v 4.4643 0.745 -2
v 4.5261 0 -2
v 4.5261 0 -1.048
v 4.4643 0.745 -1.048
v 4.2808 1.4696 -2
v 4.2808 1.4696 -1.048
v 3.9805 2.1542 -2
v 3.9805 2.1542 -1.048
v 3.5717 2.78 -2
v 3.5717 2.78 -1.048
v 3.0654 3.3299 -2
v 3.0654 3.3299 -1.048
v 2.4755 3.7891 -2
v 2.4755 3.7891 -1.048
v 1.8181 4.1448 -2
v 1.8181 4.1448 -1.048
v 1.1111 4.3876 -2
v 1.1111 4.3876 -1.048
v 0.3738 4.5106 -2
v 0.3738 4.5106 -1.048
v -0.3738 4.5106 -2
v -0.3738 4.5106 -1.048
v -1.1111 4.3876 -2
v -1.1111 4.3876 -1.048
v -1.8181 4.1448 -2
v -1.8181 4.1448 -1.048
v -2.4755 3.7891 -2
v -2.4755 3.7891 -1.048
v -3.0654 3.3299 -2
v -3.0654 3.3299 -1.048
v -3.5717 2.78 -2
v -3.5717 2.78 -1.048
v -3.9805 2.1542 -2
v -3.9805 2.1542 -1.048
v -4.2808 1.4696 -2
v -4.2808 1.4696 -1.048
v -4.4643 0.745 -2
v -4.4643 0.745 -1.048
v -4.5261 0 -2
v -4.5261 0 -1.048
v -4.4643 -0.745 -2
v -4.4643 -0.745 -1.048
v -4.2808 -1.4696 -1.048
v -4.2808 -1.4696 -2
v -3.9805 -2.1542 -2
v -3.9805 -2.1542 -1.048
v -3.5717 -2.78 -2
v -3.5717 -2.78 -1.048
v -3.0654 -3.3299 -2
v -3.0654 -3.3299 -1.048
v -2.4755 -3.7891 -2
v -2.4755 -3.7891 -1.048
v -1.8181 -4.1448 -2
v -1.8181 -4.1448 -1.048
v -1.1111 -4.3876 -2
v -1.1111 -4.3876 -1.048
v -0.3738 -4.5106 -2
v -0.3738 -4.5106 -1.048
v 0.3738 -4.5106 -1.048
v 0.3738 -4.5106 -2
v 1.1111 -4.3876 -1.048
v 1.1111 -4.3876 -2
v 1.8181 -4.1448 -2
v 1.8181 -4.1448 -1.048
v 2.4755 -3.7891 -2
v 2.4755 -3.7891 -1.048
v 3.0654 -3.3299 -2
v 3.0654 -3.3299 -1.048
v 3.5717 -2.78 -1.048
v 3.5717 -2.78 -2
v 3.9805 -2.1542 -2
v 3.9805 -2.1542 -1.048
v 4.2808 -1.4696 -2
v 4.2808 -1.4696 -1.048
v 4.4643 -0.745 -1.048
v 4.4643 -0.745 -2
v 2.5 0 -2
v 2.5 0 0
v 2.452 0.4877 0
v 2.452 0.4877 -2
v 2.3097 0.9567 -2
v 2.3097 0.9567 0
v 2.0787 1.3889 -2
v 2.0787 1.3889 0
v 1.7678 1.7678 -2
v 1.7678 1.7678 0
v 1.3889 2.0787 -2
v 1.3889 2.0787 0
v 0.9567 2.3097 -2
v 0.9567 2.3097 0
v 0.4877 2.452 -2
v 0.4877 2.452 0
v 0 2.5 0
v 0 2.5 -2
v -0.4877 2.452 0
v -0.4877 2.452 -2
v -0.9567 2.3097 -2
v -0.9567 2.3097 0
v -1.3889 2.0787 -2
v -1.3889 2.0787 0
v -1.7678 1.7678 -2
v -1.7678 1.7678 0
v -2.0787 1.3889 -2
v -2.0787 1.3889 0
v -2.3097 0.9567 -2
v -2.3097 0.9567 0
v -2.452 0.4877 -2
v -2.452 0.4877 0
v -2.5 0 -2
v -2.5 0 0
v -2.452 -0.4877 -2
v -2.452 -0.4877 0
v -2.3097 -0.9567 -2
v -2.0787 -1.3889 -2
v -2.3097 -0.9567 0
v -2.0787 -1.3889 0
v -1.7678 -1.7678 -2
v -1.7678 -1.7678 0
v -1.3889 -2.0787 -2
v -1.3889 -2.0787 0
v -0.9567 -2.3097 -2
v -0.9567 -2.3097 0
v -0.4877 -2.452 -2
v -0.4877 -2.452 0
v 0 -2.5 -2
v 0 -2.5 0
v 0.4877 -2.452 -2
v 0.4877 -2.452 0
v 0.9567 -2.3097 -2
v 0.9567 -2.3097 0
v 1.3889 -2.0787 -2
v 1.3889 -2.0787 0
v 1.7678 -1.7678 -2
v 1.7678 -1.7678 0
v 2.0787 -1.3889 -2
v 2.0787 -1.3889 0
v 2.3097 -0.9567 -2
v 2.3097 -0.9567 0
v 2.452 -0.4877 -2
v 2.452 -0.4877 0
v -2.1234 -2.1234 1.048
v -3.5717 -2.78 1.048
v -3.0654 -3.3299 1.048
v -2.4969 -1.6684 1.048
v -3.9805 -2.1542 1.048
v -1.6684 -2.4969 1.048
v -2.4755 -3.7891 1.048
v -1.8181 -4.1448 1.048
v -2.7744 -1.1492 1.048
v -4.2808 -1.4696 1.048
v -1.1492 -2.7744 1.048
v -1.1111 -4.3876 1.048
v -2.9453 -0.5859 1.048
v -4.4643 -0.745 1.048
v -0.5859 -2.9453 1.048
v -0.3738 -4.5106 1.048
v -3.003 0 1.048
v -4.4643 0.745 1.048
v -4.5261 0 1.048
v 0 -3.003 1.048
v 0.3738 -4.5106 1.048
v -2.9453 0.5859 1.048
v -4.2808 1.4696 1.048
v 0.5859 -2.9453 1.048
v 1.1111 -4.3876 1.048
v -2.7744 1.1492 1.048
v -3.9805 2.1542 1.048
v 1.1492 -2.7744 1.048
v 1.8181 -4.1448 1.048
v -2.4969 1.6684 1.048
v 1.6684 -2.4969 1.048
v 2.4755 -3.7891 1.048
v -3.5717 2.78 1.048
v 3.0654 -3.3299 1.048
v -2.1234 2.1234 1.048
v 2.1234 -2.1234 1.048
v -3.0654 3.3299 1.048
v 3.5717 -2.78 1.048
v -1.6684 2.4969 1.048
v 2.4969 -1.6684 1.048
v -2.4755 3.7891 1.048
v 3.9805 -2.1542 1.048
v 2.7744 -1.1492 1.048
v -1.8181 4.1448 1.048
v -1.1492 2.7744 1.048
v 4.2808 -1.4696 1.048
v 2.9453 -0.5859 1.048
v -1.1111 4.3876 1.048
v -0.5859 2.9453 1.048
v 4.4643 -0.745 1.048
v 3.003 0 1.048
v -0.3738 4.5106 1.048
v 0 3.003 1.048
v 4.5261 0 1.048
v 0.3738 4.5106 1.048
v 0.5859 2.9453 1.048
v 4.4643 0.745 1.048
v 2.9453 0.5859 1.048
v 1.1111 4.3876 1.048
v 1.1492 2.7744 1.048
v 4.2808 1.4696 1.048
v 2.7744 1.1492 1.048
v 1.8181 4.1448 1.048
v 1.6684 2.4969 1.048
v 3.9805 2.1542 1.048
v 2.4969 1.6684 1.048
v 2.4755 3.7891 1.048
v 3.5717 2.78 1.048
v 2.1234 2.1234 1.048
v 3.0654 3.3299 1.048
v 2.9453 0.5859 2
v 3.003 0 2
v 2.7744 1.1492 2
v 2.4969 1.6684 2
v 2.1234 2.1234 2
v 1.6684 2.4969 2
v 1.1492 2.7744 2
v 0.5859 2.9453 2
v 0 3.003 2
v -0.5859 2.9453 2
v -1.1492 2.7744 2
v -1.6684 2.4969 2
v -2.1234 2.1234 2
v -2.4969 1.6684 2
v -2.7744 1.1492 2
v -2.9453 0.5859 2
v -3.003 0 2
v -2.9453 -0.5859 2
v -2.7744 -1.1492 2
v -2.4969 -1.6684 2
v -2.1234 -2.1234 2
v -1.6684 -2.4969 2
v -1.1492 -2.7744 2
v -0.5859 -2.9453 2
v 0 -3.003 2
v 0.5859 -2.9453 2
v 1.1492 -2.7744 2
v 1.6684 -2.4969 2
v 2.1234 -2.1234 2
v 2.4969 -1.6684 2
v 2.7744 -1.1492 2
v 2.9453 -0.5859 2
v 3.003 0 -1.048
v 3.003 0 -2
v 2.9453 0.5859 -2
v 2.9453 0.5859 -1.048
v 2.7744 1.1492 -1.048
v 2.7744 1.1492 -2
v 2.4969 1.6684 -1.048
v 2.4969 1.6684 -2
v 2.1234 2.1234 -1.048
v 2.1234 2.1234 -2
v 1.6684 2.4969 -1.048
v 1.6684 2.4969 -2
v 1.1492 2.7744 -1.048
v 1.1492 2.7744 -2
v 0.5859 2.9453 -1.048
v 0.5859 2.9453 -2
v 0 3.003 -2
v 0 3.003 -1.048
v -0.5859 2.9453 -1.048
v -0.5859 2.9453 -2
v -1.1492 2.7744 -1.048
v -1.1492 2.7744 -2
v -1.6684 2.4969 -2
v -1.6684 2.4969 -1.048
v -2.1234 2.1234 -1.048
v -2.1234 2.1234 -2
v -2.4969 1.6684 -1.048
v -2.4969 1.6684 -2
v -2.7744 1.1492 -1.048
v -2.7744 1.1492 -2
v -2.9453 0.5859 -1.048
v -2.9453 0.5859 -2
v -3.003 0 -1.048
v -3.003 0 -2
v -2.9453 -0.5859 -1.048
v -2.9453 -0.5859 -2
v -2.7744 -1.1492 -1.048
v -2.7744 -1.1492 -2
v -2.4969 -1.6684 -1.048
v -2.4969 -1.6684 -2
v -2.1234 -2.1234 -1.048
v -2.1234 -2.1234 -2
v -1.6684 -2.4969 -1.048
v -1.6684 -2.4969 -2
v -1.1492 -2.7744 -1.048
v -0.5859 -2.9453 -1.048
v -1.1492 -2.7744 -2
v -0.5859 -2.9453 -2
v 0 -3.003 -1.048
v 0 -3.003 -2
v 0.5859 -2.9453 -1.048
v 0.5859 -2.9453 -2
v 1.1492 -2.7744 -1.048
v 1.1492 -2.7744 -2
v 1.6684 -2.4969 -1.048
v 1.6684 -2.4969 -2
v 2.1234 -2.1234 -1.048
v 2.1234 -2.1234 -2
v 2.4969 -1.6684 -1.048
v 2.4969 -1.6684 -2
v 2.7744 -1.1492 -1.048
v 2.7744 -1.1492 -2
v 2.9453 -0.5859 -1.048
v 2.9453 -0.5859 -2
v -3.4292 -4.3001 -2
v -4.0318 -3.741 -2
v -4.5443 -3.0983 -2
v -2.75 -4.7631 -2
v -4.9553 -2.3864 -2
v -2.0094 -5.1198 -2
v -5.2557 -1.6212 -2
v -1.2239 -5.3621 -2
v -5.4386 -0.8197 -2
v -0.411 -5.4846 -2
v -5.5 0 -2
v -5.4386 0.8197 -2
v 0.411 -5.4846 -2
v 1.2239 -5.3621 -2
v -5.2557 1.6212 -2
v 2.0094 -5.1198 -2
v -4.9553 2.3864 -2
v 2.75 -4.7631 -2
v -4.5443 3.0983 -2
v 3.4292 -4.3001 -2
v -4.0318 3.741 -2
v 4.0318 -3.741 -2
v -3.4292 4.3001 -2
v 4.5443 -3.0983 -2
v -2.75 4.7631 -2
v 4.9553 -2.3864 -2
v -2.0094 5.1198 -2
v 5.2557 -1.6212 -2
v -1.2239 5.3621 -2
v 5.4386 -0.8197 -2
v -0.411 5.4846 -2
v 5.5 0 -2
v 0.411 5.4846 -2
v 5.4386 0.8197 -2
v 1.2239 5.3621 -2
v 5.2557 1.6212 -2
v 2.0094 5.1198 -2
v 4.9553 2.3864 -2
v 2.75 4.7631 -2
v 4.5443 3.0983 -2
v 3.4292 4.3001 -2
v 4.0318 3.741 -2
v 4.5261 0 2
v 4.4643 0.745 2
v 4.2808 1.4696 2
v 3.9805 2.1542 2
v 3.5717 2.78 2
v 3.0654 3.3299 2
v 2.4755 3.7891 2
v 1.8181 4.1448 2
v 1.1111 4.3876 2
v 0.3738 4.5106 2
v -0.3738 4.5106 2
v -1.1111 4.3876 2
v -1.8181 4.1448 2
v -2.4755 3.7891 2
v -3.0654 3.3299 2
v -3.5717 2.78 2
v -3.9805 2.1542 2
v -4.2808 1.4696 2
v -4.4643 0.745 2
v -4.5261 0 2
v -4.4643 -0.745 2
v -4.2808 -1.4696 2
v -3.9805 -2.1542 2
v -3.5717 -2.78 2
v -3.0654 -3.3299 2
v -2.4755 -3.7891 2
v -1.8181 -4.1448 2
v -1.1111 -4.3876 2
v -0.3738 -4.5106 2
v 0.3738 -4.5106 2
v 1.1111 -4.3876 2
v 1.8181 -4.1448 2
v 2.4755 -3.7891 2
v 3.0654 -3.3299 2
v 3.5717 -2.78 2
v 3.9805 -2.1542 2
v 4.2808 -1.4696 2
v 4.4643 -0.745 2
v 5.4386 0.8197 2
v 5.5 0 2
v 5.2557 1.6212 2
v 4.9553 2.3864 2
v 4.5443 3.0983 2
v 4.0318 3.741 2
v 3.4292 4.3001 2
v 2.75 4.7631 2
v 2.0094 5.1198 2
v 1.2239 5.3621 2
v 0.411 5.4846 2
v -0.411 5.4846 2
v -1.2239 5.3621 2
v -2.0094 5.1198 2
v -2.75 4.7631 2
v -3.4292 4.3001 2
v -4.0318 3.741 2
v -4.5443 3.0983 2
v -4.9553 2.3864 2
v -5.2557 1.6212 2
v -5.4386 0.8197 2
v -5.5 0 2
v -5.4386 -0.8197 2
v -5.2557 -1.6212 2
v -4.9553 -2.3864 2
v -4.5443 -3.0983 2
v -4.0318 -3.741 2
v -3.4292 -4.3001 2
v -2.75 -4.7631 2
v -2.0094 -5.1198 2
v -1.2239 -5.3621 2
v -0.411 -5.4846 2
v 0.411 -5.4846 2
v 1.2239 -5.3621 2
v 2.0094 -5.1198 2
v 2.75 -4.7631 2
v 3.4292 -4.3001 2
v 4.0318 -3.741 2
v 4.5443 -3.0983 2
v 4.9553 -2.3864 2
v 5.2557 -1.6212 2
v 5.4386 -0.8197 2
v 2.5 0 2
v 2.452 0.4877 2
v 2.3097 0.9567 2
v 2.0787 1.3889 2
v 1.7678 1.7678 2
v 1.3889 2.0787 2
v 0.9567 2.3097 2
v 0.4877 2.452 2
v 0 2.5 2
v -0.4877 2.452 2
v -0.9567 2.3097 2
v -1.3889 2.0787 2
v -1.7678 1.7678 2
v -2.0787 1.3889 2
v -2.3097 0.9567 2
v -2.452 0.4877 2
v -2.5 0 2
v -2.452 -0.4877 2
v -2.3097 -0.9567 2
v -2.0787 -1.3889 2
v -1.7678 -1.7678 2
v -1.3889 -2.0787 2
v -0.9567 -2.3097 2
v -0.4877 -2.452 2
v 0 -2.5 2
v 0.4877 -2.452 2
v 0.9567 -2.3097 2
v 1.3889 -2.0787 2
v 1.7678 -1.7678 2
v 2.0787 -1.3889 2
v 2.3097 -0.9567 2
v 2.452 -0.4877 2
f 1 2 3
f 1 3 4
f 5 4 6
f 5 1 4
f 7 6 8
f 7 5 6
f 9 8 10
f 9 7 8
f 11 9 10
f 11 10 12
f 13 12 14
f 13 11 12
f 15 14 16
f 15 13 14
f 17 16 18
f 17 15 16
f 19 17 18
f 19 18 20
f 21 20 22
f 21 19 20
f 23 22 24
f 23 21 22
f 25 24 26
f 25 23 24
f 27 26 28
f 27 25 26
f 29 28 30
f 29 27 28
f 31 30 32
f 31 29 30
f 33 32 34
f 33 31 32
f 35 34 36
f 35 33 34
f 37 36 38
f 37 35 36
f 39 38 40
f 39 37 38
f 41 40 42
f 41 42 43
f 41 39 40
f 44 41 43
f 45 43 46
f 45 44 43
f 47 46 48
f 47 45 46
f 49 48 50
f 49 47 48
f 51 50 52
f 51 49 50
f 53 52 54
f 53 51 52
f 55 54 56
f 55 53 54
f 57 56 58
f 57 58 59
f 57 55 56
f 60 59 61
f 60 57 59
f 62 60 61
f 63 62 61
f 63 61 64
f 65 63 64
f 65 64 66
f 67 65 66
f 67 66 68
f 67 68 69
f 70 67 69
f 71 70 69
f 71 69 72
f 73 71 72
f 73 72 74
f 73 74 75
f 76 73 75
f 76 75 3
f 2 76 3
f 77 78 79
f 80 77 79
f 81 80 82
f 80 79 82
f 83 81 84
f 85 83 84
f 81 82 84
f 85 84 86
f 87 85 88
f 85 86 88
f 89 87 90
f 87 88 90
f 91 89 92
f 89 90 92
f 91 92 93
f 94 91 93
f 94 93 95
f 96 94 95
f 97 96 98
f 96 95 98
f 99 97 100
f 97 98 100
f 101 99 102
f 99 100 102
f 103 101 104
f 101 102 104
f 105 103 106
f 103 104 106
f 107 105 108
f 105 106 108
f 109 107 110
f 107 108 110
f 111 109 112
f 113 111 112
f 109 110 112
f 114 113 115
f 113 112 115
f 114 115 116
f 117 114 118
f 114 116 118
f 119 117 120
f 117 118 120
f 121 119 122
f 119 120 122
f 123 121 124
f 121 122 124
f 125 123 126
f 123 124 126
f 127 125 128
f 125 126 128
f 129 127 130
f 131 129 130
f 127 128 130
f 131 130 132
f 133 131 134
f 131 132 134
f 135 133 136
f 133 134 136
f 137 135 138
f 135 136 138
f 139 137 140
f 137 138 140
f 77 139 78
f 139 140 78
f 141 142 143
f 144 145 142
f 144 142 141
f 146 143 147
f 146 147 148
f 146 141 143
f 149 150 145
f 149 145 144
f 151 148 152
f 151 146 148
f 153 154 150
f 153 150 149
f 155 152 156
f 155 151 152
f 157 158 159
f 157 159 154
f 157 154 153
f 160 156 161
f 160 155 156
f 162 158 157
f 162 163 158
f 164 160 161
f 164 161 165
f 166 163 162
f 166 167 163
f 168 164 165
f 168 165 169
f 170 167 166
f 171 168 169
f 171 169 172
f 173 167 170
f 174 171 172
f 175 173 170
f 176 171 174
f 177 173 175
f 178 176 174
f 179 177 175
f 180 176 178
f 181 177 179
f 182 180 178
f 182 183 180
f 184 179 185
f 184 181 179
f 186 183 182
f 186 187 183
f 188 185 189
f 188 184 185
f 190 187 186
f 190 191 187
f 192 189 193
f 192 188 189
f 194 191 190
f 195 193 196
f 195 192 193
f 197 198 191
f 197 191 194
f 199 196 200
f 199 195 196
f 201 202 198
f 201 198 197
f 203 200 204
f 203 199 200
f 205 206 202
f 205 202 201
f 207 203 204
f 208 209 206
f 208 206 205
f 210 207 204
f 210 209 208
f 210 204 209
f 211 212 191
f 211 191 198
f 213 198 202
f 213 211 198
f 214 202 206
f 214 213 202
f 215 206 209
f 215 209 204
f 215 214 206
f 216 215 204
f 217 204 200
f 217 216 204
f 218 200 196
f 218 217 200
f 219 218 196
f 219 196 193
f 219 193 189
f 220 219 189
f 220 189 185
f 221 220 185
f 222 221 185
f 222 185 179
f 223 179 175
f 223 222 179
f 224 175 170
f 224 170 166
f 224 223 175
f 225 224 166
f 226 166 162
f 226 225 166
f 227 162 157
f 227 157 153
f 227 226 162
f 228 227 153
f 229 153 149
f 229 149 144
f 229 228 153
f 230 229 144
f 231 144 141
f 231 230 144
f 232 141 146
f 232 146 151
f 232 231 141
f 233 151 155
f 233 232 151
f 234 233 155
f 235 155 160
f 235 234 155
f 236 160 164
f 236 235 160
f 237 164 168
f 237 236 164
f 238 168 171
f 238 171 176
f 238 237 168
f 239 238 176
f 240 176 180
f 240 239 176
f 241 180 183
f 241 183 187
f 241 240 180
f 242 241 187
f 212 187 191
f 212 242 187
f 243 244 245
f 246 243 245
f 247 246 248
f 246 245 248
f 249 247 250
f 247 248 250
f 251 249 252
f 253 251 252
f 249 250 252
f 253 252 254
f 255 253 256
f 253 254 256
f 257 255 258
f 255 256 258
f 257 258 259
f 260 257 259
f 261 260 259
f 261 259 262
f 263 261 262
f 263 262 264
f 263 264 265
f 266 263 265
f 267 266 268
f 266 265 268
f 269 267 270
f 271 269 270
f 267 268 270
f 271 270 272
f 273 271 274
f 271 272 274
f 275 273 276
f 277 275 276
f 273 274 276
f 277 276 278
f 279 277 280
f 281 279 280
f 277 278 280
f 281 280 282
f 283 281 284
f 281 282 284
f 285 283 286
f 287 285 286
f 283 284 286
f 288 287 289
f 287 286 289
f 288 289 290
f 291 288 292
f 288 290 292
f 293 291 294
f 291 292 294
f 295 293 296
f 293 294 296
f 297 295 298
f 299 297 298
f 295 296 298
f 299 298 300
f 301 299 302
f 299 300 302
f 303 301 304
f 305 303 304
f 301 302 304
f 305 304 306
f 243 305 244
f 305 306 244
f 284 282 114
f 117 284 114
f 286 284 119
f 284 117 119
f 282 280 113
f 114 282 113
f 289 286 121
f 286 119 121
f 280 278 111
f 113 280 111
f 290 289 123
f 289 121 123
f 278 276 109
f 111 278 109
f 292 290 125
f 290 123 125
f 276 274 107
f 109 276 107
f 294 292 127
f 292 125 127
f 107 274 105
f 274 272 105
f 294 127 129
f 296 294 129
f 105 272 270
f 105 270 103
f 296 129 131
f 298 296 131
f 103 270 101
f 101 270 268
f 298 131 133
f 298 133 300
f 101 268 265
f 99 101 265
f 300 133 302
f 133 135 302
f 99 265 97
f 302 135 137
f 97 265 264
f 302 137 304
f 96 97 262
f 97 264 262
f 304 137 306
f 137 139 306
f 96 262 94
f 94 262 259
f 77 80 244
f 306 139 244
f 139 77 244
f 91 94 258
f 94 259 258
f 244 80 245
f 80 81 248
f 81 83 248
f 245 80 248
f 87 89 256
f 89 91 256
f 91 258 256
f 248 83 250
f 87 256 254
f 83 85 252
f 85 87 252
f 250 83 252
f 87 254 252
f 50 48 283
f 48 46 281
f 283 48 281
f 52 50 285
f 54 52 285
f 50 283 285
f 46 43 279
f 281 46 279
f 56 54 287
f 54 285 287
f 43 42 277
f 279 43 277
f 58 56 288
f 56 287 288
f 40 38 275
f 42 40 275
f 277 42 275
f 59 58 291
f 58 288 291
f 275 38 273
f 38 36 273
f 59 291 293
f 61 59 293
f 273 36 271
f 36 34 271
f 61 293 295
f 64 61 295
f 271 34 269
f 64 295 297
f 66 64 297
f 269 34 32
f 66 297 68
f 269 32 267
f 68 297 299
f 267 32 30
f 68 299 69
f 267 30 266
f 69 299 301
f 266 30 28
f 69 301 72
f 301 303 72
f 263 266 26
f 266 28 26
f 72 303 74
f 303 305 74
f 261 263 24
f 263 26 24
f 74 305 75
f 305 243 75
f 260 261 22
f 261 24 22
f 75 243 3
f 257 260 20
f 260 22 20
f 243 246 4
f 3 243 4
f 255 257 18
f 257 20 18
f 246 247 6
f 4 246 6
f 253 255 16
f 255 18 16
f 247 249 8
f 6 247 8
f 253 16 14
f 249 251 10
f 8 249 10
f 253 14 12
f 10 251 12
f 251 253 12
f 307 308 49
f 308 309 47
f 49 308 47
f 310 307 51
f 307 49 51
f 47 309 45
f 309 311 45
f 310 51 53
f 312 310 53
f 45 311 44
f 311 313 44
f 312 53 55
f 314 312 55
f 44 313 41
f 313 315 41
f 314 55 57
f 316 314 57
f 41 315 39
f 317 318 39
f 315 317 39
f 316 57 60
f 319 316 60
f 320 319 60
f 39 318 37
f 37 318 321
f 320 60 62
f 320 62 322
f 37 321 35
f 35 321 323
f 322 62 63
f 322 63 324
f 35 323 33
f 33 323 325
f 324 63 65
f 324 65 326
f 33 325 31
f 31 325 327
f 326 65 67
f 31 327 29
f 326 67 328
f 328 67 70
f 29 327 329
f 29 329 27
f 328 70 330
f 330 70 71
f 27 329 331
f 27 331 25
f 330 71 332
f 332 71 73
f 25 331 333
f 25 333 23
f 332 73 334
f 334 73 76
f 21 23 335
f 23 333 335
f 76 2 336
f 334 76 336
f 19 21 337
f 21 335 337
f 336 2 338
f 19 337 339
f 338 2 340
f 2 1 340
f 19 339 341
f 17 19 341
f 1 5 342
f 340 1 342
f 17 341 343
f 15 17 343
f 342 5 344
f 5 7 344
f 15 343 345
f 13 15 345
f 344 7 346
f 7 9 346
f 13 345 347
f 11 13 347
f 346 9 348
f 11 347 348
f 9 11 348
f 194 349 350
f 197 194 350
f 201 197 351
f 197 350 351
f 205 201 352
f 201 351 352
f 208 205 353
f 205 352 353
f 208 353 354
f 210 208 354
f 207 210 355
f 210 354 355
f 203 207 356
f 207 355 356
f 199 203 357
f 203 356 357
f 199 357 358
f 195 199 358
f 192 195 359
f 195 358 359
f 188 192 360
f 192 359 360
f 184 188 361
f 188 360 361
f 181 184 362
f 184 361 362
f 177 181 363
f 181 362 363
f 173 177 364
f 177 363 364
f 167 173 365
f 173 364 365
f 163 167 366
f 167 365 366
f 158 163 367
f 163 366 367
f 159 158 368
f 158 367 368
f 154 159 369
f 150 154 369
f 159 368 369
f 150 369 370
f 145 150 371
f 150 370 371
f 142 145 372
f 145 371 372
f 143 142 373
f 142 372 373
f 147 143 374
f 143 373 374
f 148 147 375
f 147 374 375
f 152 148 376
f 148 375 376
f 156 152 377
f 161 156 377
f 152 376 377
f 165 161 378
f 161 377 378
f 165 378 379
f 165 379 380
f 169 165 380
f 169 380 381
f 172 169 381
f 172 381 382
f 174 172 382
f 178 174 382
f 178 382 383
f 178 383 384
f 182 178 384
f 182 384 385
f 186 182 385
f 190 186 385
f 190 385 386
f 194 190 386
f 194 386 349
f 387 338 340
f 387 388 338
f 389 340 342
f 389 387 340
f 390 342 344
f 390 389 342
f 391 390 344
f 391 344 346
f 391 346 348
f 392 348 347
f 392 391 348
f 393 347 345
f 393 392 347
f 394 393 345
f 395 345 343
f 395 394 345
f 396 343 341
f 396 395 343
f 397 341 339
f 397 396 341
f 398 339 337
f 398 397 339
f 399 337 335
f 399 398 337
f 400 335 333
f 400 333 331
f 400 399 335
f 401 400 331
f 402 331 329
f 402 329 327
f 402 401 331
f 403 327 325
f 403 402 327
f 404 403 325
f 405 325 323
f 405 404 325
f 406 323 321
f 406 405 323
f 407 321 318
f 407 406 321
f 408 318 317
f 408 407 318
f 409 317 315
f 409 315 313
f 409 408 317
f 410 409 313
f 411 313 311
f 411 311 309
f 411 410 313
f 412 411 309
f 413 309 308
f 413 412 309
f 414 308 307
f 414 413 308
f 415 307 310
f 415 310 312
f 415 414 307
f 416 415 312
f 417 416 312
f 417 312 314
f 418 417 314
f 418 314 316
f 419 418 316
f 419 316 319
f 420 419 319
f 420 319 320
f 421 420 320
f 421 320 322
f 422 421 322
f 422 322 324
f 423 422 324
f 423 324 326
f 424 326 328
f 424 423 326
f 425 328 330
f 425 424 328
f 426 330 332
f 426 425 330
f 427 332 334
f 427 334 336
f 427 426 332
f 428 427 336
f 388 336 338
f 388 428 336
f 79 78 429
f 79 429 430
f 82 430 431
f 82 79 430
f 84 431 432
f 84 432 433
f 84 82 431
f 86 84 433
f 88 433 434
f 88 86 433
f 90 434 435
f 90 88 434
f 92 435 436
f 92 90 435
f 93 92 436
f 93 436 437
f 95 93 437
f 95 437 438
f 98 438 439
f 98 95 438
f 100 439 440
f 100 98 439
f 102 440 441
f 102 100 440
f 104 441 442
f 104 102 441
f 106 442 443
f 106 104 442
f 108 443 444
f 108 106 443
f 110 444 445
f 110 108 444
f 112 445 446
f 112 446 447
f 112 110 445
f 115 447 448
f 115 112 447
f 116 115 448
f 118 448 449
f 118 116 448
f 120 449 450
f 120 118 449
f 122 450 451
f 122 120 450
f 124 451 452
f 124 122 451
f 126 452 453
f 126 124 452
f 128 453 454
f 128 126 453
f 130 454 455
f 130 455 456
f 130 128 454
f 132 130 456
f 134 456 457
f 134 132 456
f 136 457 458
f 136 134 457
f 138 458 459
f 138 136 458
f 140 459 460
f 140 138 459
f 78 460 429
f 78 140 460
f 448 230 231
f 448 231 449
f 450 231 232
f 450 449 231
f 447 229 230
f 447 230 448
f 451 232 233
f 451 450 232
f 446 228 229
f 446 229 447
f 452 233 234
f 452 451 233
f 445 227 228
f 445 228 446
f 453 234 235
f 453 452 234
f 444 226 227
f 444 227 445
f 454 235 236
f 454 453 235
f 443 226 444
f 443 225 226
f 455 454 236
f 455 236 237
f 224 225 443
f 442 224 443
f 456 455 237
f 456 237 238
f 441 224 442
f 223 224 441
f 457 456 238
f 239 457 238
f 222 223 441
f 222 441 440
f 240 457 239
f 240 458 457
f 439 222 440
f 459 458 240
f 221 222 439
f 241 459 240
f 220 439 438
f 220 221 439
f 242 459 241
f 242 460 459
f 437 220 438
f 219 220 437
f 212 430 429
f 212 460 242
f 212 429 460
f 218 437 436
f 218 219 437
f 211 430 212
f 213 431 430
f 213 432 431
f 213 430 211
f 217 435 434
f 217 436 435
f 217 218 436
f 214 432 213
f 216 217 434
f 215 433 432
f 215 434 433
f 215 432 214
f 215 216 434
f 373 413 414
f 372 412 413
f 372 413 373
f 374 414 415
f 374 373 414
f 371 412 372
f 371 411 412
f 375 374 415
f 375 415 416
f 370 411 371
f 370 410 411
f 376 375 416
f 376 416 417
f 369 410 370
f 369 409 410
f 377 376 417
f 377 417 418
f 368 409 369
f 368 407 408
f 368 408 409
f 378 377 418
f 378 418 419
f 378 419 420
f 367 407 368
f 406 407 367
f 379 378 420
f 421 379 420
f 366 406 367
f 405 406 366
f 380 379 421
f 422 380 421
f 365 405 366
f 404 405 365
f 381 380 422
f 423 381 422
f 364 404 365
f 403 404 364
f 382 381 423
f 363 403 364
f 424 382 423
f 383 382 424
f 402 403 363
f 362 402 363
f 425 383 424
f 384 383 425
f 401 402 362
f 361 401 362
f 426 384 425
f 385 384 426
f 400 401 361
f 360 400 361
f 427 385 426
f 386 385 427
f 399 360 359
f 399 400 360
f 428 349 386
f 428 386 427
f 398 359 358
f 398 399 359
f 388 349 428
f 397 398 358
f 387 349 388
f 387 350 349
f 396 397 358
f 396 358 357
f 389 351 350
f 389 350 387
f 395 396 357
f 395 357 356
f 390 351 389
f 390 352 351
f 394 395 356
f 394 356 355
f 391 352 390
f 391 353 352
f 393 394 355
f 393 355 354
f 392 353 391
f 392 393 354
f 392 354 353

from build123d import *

# Parameters (mm, degrees)
SKETCH1_R           = 5.5
SKETCH1_R_2         = 2.5
BOSS_EXTRUDE1_DEPTH = 2
SKETCH2_R           = 4.526057725
SKETCH2_R_2         = 3.002990226
CUT_EXTRUDE1_DEPTH  = 0.952


with BuildPart() as part:
    # Sketch1 → Boss-Extrude1 (new body)
    with BuildSketch(Plane.XY):
        Circle(SKETCH1_R)
        Circle(SKETCH1_R_2, mode=Mode.SUBTRACT)
    extrude(amount=BOSS_EXTRUDE1_DEPTH)

    # Sketch2 → Cut-Extrude1 (cut)
    with BuildSketch(Plane.XY.offset(2)):
        Circle(SKETCH2_R)
        Circle(SKETCH2_R_2, mode=Mode.SUBTRACT)
    extrude(amount=-CUT_EXTRUDE1_DEPTH, mode=Mode.SUBTRACT)

    # Mirror1: part across plane


with BuildPart() as part_1:
    add(part.part)
    add(part.part.mirror(Plane.XY))


solid = part_1.part
